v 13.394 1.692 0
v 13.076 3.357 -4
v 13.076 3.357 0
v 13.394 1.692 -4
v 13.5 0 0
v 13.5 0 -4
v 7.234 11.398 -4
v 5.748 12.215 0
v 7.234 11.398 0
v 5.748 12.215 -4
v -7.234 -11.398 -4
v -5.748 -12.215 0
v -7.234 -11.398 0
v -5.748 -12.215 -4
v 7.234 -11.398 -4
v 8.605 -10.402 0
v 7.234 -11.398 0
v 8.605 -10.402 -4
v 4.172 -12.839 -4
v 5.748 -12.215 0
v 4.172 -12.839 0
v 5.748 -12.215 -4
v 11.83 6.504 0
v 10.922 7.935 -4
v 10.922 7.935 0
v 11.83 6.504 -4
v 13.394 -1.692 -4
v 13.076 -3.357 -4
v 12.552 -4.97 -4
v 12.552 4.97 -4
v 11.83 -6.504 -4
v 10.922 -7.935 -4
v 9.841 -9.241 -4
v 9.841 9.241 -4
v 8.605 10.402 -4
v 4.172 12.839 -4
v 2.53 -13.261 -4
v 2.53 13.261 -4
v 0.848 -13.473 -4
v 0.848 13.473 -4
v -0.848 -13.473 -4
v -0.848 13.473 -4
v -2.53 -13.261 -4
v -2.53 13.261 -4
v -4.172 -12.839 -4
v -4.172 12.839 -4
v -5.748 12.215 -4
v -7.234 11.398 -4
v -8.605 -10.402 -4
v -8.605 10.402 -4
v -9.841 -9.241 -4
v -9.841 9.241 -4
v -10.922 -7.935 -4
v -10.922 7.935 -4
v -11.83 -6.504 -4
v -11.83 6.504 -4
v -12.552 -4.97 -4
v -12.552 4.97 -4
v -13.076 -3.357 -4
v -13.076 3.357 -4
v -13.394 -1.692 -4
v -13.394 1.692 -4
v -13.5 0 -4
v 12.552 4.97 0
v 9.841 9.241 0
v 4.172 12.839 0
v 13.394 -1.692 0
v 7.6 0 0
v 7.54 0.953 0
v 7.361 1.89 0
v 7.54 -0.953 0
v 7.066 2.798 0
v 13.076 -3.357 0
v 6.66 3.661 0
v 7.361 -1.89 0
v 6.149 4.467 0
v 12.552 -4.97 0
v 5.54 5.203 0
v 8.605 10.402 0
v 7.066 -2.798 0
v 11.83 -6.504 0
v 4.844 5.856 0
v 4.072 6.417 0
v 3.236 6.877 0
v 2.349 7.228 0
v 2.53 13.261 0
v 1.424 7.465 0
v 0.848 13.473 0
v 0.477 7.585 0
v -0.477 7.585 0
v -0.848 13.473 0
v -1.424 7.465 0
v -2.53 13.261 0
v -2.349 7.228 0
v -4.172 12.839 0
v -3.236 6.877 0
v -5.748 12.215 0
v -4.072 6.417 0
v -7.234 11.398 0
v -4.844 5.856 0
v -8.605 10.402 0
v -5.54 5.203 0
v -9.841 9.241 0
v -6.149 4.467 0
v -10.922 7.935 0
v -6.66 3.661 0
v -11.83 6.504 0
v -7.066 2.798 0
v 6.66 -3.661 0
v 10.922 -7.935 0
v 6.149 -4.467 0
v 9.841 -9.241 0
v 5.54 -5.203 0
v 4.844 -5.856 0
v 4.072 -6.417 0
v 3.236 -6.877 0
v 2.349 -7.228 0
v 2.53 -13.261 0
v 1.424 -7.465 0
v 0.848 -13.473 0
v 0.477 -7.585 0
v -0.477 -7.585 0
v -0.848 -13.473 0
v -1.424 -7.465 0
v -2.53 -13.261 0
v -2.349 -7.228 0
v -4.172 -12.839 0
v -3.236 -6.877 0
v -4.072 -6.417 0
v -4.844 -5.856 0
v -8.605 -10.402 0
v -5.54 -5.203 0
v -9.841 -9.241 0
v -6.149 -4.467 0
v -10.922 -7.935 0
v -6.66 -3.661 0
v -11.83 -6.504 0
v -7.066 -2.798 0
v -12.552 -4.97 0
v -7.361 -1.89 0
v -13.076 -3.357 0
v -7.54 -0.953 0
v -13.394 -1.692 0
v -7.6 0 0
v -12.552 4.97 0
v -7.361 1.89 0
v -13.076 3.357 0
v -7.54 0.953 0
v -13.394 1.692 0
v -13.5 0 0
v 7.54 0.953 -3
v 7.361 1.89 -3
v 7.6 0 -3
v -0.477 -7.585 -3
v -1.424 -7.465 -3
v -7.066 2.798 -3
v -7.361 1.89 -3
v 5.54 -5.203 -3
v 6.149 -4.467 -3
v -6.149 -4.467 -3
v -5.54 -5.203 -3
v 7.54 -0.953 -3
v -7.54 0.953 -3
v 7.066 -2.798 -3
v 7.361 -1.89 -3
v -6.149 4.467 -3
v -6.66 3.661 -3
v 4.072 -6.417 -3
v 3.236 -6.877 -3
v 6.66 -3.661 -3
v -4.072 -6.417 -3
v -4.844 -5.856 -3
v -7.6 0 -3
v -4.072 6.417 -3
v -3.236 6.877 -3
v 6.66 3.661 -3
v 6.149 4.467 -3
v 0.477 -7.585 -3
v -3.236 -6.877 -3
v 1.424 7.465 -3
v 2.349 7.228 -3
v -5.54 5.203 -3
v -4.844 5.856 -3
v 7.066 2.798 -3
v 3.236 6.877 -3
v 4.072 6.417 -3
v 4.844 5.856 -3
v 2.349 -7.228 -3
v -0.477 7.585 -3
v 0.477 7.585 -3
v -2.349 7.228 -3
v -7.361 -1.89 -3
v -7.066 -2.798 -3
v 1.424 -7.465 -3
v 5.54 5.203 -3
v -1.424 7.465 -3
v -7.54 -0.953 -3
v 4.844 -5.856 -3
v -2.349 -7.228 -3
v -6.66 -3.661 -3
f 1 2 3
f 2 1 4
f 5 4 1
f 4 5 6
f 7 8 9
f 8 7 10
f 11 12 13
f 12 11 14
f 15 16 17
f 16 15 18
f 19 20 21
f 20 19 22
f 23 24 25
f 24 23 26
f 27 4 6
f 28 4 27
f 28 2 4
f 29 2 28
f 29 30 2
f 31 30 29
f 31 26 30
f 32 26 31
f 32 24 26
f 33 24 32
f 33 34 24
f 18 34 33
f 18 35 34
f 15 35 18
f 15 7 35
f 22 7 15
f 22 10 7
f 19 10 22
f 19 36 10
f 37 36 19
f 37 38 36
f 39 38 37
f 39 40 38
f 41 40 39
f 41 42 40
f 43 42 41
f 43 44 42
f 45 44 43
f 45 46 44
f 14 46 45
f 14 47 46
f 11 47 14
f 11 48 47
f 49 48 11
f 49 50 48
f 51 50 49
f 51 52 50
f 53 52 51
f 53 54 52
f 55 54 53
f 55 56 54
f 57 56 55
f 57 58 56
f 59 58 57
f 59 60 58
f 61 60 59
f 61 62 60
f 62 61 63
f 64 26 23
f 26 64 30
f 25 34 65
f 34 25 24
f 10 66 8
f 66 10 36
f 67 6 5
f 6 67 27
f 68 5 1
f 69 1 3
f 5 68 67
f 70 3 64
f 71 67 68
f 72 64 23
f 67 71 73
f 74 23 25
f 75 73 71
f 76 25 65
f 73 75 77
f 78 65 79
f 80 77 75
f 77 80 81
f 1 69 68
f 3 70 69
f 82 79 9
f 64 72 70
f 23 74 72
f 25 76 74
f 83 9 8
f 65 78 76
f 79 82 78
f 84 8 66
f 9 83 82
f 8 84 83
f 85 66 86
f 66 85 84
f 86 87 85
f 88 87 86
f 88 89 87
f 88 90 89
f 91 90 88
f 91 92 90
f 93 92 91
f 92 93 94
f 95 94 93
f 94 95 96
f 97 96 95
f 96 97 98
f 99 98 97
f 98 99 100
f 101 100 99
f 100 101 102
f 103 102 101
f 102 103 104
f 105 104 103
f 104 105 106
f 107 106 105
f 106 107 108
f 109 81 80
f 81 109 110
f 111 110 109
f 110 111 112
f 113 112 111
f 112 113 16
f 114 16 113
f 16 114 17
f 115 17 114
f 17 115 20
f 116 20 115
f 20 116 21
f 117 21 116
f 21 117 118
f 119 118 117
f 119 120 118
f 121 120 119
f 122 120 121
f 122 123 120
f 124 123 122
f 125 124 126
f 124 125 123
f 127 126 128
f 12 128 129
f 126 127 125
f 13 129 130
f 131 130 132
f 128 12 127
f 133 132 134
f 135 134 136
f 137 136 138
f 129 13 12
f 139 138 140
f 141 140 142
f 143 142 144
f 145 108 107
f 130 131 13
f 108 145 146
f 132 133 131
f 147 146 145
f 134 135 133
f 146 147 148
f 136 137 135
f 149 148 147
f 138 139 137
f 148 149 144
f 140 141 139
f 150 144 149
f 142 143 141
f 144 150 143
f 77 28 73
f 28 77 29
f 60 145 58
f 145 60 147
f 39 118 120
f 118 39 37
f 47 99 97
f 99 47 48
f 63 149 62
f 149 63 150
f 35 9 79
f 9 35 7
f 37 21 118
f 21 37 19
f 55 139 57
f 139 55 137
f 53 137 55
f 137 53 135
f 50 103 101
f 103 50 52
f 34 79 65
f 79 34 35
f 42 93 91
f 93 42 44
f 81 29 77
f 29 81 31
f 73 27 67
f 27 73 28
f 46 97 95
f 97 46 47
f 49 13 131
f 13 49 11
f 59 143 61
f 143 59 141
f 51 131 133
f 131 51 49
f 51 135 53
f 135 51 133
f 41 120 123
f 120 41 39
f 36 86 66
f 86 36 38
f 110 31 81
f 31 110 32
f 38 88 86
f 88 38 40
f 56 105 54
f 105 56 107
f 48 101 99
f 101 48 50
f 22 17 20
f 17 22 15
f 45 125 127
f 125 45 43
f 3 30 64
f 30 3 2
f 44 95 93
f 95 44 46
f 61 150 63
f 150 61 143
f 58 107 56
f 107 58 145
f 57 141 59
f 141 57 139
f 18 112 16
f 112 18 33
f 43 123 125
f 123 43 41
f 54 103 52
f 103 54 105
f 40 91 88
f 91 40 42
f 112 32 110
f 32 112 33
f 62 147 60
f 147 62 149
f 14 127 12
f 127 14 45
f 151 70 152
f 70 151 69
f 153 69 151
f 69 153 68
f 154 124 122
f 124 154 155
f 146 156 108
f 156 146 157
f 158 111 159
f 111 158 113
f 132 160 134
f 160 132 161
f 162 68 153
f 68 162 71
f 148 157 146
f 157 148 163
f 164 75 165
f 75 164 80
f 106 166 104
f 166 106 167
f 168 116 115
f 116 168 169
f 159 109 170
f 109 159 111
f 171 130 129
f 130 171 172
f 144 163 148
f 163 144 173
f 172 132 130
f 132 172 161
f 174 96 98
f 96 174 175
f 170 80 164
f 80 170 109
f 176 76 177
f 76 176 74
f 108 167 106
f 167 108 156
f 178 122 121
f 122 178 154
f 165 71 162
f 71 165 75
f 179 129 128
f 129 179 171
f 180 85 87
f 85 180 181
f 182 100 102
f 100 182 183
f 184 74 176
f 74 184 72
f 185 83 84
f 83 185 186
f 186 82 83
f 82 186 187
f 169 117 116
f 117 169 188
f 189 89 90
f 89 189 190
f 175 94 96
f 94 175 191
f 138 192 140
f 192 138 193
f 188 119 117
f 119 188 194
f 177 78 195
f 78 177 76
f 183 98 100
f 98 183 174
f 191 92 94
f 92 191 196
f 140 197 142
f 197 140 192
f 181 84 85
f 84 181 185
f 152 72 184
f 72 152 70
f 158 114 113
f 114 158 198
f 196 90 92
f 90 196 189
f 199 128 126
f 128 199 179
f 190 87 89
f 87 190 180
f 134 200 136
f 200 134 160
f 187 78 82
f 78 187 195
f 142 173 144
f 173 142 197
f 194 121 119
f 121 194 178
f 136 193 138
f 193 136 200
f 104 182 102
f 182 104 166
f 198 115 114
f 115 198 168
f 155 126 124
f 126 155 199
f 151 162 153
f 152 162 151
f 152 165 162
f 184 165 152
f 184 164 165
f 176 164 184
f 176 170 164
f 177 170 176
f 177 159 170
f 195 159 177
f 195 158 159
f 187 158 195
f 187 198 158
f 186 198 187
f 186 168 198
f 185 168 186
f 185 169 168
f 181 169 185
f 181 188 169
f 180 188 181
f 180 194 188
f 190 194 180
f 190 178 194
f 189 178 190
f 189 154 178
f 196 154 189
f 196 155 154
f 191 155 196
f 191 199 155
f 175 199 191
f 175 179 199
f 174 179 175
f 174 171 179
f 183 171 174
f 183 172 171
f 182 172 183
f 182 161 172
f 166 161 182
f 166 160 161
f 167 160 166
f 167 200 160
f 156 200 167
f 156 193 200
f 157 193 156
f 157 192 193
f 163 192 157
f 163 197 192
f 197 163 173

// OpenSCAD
$fn = 50;


difference() {
	union() {
		translate(v = [0, 0, -4.0000000000]) {
			cylinder(h = 4, r = 13.5000000000);
		}
	}
	union() {
		#translate(v = [0, 0, -3.0000000000]) {
			cylinder(h = 3, r = 7.6000000000);
		}
	}
}
